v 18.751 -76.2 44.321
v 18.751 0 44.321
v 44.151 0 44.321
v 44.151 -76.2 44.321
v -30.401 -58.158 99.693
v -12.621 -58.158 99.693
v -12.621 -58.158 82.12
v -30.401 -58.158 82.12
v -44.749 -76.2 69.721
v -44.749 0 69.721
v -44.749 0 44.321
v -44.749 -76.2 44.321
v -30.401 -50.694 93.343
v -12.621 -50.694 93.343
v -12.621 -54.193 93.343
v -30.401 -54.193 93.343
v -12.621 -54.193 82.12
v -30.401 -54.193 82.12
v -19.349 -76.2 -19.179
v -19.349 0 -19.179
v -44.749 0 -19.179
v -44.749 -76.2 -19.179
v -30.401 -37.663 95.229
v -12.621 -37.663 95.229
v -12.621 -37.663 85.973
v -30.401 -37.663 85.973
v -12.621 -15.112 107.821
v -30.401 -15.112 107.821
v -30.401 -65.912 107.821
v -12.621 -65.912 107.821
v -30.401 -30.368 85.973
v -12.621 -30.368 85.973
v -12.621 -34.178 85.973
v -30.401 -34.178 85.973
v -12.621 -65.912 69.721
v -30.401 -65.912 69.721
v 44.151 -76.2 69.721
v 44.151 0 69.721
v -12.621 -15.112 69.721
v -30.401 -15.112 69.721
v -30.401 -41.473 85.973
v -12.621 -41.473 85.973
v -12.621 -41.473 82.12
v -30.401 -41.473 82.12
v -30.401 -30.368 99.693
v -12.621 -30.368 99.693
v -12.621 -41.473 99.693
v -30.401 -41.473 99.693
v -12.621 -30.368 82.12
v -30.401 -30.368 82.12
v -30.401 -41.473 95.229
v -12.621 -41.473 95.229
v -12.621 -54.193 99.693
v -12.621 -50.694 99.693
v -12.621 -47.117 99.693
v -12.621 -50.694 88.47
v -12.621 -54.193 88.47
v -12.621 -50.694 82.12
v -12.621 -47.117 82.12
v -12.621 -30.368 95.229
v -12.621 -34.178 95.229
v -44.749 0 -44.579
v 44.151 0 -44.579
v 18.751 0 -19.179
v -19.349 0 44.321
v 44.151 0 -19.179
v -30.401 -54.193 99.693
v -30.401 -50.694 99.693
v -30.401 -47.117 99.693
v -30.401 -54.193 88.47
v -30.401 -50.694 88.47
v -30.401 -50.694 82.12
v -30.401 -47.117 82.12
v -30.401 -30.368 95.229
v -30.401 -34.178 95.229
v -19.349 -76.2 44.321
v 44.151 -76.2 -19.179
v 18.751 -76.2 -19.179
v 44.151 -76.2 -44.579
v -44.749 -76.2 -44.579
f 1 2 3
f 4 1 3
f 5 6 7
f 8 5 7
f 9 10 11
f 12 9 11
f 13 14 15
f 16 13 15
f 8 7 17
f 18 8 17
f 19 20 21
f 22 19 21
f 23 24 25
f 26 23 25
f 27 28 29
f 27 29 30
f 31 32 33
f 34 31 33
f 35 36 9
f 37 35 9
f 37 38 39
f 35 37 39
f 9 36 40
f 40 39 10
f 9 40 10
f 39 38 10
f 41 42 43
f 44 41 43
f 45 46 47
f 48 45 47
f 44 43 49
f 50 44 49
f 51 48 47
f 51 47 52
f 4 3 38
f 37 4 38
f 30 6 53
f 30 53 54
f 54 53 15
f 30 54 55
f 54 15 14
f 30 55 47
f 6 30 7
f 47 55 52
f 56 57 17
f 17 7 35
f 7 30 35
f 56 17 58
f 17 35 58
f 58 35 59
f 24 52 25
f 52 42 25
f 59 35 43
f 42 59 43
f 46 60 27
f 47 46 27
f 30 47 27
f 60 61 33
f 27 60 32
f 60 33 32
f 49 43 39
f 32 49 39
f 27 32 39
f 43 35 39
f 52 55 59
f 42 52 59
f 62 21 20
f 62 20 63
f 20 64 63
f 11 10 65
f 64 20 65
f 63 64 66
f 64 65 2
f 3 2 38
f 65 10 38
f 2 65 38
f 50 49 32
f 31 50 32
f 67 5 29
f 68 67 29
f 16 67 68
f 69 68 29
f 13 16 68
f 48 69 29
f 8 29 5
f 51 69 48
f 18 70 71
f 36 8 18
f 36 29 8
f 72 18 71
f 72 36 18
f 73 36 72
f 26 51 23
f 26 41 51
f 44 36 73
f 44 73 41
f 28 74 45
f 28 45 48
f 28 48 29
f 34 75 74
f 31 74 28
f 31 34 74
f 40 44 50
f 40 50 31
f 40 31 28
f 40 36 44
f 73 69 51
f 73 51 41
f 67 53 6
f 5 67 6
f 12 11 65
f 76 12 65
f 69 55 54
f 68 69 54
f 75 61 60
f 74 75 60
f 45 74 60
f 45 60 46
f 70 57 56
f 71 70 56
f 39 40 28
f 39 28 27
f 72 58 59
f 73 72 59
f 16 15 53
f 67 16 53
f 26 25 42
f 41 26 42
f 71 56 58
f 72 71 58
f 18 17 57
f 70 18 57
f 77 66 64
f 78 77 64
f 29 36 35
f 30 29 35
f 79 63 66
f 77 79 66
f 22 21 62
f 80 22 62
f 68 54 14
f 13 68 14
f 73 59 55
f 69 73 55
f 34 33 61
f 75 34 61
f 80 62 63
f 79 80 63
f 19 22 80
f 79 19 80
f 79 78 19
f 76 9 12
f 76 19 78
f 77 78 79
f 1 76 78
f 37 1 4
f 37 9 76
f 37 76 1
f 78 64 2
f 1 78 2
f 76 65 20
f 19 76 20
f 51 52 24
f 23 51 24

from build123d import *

# Parameters (mm, degrees)
F1_DEPTH = 76.2
F2_W     = 17.78
F2_H     = 50.8
F3_DEPTH = 38.1
F5_DEPTH = 63.5
F7_DEPTH = 63.5


with BuildPart() as f1:
    # F0 (on Front) → F1 (new body)
    with BuildSketch(Plane.XZ):
        Polygon((-44.748871, -19.178686), (-44.748871, -44.578686), (44.151129, -44.578686), (44.151129, -19.178686), (18.751129, -19.178686), (18.751129, 44.321314), (44.151129, 44.321314), (44.151129, 69.721314), (-44.748871, 69.721314), (-44.748871, 44.321314), (-19.348871, 44.321314), (-19.348871, -19.178686), align=None)
    extrude(amount=F1_DEPTH)

    # F2 (on face) → F3 (join)
    with BuildSketch(Plane.XY.offset(69.721314)):
        with Locations((-21.511204, -40.512243)):
            Rectangle(F2_W, F2_H)
    extrude(amount=F3_DEPTH)

    # F4 (on face) → F5 (cut)
    with BuildSketch(Plane.YZ.offset(-12.621204)):
        Polygon((-54.192732, 99.692909), (-58.158241, 99.692909), (-58.158241, 82.120264), (-54.192732, 82.120264), (-54.192732, 88.470264), (-50.693755, 88.470264), (-50.693755, 82.120264), (-47.117021, 82.120264), (-47.117021, 99.692909), (-50.693755, 99.692909), (-50.693755, 93.342909), (-54.192732, 93.342909), align=None)
    extrude(amount=-F5_DEPTH, mode=Mode.SUBTRACT)

    # F6 (on face) → F7 (cut)
    with BuildSketch(Plane.YZ.offset(-12.621204)):
        Polygon((-34.177791, 95.228866), (-30.367791, 95.228866), (-30.367791, 99.692909), (-41.473001, 99.692909), (-41.473001, 95.228866), (-37.663001, 95.228866), (-37.663001, 85.972577), (-41.473001, 85.972577), (-41.473001, 82.120264), (-30.367791, 82.120264), (-30.367791, 85.972577), (-34.177791, 85.972577), align=None)
    extrude(amount=-F7_DEPTH, mode=Mode.SUBTRACT)


solid = f1.part
